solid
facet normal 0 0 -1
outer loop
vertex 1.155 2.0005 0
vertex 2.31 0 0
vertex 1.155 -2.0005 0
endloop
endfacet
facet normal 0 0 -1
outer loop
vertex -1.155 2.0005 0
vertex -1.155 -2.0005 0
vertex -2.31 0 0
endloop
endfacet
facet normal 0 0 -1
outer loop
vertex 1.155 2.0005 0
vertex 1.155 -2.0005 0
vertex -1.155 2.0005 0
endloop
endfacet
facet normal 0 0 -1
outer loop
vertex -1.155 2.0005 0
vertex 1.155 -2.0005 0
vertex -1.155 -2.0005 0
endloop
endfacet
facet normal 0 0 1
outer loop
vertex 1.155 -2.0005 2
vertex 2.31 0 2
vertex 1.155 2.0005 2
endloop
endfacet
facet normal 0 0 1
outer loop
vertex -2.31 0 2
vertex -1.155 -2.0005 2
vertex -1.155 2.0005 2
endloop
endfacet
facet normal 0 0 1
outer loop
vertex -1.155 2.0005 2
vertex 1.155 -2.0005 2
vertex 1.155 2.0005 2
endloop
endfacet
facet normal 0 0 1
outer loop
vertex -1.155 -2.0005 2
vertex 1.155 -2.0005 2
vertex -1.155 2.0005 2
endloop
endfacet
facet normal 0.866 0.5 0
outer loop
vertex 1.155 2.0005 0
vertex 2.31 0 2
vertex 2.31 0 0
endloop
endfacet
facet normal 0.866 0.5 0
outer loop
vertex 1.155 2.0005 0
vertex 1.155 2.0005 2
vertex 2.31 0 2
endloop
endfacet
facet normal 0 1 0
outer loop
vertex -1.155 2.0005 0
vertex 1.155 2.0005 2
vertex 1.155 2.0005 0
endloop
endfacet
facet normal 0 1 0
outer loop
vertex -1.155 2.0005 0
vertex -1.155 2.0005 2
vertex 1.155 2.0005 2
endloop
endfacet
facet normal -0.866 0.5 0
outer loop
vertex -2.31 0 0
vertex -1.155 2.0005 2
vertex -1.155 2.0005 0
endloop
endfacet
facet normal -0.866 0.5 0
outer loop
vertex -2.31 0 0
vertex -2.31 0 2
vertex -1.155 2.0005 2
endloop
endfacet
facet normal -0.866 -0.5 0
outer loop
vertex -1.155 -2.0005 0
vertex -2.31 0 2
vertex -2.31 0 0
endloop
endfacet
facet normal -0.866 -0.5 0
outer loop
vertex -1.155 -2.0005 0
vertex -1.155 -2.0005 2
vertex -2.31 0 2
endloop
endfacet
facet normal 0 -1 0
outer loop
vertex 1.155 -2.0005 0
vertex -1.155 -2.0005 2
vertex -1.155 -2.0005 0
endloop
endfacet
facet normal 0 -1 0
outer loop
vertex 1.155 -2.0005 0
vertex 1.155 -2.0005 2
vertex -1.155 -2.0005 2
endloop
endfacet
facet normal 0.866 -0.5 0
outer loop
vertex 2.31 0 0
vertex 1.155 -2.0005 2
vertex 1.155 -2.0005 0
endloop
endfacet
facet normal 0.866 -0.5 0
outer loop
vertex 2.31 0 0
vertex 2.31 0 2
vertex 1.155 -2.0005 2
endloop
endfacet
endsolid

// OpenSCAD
$fn=90;

// https://www.engineersedge.com/hardware/standard_metric_hex_nuts_13728.htm
// m2: d=4    D=4.62
// m3: d=5.5  D=6.35
module hex(D,t){
    x = D/2;
    y = sqrt(3)/2*x;
    pts = [
        [x/2,y],
        [x,0],
        [x/2,-y],
        [-x/2,-y],
        [-x,0],
        [-x/2,y]
    ];
    linear_extrude(height=t){
        polygon(pts);
    }
    echo(2*x);
    echo(2*y);
}

module m3(){
    hex(6.35,3);
}

module m2(){
    hex(4.62,2);
}


//rotate([0,0,0]) hex3(4.62,2);
//circle(15);
m2();
